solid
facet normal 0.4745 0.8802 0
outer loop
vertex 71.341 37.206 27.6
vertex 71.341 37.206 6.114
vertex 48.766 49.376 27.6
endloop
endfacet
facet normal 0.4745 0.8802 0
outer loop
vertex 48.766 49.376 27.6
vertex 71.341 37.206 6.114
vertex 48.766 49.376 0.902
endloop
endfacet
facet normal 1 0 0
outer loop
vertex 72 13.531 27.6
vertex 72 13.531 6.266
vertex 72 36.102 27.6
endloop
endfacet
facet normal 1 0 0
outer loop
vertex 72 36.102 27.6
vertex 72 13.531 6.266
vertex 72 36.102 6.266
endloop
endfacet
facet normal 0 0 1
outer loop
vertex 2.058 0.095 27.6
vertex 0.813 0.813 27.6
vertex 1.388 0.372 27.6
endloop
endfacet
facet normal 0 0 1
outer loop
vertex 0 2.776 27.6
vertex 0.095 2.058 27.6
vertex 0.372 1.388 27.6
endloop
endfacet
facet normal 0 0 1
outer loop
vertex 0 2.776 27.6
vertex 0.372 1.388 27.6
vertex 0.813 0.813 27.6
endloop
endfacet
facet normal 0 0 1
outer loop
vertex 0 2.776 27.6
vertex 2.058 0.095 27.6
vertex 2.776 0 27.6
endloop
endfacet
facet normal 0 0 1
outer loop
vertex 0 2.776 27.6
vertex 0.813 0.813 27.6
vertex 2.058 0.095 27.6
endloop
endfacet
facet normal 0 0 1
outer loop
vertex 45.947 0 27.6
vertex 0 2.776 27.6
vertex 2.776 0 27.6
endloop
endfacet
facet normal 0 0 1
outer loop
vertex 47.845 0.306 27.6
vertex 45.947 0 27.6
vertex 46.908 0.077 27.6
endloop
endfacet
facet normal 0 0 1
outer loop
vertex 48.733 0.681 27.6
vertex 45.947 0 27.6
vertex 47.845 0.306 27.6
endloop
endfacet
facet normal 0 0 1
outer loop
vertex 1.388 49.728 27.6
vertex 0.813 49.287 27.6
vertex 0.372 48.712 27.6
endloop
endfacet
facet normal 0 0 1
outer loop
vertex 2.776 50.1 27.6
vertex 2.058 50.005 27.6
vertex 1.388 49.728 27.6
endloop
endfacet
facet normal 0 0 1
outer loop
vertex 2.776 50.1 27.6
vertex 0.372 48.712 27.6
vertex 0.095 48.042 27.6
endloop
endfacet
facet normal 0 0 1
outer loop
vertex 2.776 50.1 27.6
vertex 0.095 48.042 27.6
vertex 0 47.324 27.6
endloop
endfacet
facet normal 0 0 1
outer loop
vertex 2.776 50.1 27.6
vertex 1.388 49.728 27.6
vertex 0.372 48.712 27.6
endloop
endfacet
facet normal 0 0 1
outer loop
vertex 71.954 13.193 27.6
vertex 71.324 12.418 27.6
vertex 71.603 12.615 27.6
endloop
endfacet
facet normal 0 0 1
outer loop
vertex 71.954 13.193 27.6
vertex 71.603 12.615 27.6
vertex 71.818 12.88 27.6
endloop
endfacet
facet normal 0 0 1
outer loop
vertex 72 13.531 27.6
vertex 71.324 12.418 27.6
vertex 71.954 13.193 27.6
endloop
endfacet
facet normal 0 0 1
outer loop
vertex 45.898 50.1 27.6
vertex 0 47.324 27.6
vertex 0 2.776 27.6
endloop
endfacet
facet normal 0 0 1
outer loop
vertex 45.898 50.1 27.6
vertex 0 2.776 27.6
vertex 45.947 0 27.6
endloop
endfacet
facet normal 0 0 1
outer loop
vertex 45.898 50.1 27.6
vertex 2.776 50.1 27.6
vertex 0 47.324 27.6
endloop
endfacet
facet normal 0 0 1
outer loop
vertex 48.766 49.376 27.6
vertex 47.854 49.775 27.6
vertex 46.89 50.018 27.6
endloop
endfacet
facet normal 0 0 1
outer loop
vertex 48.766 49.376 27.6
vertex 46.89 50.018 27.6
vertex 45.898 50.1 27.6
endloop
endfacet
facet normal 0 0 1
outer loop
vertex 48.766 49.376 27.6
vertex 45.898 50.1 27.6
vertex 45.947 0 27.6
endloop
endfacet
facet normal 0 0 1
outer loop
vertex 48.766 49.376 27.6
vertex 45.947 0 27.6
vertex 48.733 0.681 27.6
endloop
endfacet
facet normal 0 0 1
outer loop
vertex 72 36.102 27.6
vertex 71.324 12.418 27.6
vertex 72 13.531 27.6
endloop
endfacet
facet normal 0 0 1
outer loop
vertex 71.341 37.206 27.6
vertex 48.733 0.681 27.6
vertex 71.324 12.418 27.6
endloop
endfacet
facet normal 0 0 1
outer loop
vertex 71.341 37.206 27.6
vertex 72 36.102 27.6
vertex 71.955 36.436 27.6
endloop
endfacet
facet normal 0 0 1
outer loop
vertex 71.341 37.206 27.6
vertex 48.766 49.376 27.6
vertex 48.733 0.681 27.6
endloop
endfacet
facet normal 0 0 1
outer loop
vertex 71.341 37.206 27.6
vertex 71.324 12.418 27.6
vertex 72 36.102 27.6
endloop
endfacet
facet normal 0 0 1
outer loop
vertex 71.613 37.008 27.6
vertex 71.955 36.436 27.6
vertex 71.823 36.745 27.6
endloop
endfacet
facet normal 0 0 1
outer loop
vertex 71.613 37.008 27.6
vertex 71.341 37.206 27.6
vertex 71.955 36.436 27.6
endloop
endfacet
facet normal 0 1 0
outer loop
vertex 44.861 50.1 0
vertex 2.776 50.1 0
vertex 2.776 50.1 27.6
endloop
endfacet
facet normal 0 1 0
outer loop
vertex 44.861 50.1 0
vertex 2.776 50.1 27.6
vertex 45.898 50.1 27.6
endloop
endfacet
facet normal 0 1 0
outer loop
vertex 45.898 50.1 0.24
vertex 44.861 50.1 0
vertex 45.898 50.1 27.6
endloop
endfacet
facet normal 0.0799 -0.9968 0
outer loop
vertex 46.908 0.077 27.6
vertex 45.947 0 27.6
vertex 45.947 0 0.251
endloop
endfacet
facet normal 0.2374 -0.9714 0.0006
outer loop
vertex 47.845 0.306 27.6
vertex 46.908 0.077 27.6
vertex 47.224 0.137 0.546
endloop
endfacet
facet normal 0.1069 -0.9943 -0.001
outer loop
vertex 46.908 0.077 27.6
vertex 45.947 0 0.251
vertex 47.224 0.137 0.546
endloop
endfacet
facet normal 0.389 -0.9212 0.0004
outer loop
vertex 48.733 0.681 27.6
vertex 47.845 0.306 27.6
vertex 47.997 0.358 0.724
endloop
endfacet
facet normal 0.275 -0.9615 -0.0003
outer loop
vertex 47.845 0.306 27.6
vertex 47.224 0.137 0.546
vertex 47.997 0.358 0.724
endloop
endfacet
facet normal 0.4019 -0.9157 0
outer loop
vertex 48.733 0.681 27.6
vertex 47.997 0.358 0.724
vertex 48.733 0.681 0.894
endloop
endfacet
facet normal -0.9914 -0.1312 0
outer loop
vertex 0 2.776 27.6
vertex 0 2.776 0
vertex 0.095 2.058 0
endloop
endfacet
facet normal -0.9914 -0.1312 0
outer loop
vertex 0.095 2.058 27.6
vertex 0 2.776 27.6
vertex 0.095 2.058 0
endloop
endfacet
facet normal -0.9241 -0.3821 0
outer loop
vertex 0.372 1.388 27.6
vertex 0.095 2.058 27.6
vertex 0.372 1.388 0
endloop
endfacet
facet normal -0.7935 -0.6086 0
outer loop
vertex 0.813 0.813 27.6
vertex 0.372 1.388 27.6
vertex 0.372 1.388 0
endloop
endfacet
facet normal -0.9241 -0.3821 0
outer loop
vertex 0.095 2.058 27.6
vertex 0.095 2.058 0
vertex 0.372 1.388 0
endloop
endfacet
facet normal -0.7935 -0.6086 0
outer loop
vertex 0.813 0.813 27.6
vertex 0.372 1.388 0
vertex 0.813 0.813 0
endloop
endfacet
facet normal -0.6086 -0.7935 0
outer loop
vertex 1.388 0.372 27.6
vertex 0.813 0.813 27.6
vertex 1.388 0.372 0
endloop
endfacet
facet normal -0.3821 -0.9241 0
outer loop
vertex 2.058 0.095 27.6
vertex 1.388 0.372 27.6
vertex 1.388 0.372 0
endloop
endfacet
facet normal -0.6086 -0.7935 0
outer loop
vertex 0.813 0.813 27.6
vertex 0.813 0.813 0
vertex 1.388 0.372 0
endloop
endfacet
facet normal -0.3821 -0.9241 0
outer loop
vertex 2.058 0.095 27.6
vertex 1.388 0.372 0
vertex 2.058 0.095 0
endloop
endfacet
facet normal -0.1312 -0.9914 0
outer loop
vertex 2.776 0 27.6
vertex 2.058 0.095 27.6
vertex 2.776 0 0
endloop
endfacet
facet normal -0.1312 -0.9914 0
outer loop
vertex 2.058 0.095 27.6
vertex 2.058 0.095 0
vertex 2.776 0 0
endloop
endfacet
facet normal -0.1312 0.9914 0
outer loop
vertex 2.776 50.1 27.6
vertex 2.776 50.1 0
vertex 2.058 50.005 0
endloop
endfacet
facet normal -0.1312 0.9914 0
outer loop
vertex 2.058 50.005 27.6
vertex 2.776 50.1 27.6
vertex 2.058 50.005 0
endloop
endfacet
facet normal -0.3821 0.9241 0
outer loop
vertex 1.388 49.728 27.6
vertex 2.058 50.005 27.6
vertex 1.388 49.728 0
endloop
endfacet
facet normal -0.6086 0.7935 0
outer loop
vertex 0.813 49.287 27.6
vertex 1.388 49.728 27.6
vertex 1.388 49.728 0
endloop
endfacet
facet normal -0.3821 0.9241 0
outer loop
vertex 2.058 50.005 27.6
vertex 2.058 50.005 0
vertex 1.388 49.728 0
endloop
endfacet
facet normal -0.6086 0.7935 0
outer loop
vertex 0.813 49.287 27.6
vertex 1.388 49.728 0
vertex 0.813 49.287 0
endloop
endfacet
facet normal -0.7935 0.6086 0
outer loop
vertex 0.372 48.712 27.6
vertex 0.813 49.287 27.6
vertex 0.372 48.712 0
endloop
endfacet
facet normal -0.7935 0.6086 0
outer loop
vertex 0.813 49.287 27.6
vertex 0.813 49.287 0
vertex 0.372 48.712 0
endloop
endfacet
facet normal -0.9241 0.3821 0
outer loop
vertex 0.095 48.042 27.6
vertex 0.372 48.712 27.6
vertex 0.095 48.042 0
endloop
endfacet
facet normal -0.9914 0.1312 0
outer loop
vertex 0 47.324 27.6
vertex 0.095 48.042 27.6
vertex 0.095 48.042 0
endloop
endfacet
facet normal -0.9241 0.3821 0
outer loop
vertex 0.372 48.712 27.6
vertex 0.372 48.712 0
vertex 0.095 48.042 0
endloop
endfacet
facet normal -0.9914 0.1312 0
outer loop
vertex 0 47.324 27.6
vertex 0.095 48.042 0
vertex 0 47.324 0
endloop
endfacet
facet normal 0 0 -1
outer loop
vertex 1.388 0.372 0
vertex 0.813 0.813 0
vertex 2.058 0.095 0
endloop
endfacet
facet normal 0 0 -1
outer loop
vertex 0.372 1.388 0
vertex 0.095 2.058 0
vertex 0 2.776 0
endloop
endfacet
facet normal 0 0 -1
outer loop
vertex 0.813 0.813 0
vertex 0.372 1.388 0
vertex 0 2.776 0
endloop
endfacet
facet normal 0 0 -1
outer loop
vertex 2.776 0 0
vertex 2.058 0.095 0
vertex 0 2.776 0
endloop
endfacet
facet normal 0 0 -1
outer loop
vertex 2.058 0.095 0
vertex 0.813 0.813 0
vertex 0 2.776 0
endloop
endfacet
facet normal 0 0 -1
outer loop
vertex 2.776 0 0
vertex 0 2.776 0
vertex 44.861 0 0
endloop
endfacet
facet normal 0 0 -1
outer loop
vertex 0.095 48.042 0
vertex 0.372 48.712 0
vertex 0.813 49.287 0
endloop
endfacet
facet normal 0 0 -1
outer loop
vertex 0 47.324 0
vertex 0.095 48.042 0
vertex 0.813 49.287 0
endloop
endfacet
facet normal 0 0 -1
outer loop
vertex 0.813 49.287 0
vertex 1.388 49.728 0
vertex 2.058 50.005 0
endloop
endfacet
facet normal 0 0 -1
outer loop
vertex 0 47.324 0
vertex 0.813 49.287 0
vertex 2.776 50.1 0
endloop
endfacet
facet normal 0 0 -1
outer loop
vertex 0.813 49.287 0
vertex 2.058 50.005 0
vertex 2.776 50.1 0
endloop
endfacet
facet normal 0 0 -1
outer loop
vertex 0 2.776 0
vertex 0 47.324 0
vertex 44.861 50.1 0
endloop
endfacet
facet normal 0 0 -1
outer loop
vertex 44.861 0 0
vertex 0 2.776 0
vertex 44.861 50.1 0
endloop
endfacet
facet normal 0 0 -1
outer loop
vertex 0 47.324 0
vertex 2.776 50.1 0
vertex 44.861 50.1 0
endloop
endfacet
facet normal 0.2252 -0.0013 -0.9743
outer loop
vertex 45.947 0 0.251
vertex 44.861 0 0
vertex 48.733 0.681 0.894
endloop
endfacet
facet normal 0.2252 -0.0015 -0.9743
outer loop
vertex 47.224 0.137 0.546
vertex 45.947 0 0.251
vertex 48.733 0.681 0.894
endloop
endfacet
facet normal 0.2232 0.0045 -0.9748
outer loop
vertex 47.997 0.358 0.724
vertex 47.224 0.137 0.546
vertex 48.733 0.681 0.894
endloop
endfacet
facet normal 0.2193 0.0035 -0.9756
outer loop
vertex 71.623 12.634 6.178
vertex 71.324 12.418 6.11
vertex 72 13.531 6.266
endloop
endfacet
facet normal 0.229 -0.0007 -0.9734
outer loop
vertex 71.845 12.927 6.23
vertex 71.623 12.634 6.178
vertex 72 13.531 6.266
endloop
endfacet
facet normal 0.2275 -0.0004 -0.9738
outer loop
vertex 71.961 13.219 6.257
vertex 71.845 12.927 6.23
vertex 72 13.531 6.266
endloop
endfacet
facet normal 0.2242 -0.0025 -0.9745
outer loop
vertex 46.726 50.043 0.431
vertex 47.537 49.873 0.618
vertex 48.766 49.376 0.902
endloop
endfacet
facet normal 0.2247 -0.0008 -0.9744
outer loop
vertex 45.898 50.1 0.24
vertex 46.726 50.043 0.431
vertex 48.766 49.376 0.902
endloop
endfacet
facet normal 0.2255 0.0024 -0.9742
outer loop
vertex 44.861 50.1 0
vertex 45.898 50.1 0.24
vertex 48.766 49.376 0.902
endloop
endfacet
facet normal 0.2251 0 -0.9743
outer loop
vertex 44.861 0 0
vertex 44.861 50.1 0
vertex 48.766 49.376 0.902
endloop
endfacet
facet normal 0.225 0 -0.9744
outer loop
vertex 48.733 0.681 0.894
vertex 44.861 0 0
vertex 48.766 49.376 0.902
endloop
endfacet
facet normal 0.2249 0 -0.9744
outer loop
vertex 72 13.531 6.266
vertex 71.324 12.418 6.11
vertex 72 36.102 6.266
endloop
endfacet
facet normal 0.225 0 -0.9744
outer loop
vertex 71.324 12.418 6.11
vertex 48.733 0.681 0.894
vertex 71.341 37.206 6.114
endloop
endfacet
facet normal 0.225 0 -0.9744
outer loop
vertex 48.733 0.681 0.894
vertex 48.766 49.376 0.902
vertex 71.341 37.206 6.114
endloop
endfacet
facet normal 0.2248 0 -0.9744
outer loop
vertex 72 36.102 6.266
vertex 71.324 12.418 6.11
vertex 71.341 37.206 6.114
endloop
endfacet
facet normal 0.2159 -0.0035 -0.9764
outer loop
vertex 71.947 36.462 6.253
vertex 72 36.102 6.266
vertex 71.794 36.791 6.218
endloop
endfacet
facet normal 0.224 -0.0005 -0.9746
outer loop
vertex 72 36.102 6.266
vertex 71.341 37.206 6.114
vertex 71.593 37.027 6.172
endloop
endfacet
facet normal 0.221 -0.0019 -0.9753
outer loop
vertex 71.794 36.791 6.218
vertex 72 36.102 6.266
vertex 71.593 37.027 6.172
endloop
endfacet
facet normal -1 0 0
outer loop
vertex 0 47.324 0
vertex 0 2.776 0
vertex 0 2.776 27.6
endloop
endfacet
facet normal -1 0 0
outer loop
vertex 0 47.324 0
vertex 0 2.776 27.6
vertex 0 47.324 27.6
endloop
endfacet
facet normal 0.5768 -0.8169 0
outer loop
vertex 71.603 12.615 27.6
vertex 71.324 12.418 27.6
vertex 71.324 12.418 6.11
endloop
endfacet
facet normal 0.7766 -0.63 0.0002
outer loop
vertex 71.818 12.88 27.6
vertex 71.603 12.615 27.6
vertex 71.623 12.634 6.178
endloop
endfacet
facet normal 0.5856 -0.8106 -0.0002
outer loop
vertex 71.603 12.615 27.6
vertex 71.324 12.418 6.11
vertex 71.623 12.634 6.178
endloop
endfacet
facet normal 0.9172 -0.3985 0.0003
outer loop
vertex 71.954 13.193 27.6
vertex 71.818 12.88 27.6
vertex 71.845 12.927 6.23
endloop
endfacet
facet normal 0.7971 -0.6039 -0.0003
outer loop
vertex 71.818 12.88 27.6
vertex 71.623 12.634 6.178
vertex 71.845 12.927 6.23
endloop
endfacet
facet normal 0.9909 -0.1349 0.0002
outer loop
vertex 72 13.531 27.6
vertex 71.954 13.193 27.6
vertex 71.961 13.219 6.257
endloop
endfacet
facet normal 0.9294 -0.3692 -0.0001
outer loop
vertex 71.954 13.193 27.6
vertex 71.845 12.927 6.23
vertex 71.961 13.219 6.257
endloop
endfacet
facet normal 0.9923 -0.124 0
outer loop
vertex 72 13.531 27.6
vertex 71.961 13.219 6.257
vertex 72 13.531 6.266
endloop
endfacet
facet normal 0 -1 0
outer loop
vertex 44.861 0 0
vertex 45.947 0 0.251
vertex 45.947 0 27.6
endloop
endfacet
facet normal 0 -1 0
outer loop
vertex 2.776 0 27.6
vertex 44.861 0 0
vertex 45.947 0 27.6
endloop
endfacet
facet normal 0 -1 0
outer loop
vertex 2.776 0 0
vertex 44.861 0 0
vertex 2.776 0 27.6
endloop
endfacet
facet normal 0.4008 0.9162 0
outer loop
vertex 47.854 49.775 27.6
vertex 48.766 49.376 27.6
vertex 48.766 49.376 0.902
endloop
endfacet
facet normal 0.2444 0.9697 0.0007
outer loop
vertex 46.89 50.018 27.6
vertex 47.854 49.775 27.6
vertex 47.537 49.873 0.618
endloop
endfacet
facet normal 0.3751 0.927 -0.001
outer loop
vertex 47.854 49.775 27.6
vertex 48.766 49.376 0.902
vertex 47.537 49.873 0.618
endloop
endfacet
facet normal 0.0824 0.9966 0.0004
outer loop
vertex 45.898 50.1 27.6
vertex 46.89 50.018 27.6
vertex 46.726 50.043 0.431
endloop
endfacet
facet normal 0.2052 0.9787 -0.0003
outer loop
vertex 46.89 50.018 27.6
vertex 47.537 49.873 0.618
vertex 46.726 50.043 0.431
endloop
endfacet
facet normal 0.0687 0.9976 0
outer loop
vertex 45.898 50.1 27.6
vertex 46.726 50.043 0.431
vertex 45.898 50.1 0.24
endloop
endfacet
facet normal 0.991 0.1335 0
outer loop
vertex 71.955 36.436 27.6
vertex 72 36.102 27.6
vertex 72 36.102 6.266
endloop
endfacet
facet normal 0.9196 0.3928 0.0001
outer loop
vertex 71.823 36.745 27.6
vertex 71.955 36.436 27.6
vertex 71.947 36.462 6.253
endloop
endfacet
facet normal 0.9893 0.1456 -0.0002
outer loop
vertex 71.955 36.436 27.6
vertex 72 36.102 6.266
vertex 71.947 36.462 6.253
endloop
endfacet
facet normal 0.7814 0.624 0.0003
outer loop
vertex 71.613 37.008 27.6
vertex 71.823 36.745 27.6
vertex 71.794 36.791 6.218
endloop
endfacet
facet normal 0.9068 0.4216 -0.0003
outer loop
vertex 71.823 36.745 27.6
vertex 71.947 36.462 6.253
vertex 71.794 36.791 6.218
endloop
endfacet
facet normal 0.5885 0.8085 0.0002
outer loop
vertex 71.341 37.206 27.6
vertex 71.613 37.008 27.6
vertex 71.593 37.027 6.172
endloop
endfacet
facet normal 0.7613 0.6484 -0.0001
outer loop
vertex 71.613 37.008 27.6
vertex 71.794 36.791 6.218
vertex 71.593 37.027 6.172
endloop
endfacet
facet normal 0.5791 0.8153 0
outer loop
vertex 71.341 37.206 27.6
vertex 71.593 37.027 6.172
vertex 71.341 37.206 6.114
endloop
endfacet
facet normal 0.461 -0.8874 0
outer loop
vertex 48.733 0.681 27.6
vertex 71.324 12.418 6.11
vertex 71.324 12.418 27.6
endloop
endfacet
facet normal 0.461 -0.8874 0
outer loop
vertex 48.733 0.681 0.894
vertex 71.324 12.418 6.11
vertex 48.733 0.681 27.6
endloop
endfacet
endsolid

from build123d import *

# Parameters (mm, degrees)
BOX_W               = 29
BOX_H               = 73
BOX_DEPTH           = 10
BOX_PLACEMENT_ANGLE = 13
PAD_DEPTH           = 27.6


with BuildPart() as cube:
    # Box → Box (new body)
    with BuildSketch(Plane.XY):
        with Locations((14.5, 36.5)):
            Rectangle(BOX_W, BOX_H)
    extrude(amount=BOX_DEPTH)


with BuildPart() as cube_1:
    # Box placement: moved
    add(cube.part.moved(Location((46, -5, -10))).rotate(Axis((46, -5, -10), (0, -1, 0)), BOX_PLACEMENT_ANGLE))


with BuildPart() as cutted_flask:
    # Sketch → Pad (new body)
    with BuildSketch(Plane.XY):
        with BuildLine():
            ThreePointArc((2.776495, 50.1), (0.813217, 49.286783), (0, 47.323505))
            Line((0, 2.776495), (0, 47.323505))
            ThreePointArc((0, 2.776495), (0.813217, 0.813217), (2.776495, 0))
            Line((45.947206, 0), (2.776495, 0))
            ThreePointArc((45.947206, 0), (47.381198, 0.172613), (48.733265, 0.680592))
            Line((71.324311, 12.41834), (48.733265, 0.680592))
            ThreePointArc((71.324311, 12.41834), (71.817845, 12.880043), (72, 13.530861))
            Line((72, 25.05), (72, 13.530861))
            Line((72, 25.05), (72, 36.102443))
            ThreePointArc((72, 36.102443), (71.822776, 36.745073), (71.341206, 37.206021))
            Line((71.341206, 37.206021), (48.765787, 49.376307))
            ThreePointArc((48.765787, 49.376307), (47.376999, 49.916284), (45.898298, 50.1))
            Line((2.776495, 50.1), (45.898298, 50.1))
        make_face()
    extrude(amount=PAD_DEPTH)

    # Cut: cut Cube
    add(cube_1.part, mode=Mode.SUBTRACT)


solid = cutted_flask.part
